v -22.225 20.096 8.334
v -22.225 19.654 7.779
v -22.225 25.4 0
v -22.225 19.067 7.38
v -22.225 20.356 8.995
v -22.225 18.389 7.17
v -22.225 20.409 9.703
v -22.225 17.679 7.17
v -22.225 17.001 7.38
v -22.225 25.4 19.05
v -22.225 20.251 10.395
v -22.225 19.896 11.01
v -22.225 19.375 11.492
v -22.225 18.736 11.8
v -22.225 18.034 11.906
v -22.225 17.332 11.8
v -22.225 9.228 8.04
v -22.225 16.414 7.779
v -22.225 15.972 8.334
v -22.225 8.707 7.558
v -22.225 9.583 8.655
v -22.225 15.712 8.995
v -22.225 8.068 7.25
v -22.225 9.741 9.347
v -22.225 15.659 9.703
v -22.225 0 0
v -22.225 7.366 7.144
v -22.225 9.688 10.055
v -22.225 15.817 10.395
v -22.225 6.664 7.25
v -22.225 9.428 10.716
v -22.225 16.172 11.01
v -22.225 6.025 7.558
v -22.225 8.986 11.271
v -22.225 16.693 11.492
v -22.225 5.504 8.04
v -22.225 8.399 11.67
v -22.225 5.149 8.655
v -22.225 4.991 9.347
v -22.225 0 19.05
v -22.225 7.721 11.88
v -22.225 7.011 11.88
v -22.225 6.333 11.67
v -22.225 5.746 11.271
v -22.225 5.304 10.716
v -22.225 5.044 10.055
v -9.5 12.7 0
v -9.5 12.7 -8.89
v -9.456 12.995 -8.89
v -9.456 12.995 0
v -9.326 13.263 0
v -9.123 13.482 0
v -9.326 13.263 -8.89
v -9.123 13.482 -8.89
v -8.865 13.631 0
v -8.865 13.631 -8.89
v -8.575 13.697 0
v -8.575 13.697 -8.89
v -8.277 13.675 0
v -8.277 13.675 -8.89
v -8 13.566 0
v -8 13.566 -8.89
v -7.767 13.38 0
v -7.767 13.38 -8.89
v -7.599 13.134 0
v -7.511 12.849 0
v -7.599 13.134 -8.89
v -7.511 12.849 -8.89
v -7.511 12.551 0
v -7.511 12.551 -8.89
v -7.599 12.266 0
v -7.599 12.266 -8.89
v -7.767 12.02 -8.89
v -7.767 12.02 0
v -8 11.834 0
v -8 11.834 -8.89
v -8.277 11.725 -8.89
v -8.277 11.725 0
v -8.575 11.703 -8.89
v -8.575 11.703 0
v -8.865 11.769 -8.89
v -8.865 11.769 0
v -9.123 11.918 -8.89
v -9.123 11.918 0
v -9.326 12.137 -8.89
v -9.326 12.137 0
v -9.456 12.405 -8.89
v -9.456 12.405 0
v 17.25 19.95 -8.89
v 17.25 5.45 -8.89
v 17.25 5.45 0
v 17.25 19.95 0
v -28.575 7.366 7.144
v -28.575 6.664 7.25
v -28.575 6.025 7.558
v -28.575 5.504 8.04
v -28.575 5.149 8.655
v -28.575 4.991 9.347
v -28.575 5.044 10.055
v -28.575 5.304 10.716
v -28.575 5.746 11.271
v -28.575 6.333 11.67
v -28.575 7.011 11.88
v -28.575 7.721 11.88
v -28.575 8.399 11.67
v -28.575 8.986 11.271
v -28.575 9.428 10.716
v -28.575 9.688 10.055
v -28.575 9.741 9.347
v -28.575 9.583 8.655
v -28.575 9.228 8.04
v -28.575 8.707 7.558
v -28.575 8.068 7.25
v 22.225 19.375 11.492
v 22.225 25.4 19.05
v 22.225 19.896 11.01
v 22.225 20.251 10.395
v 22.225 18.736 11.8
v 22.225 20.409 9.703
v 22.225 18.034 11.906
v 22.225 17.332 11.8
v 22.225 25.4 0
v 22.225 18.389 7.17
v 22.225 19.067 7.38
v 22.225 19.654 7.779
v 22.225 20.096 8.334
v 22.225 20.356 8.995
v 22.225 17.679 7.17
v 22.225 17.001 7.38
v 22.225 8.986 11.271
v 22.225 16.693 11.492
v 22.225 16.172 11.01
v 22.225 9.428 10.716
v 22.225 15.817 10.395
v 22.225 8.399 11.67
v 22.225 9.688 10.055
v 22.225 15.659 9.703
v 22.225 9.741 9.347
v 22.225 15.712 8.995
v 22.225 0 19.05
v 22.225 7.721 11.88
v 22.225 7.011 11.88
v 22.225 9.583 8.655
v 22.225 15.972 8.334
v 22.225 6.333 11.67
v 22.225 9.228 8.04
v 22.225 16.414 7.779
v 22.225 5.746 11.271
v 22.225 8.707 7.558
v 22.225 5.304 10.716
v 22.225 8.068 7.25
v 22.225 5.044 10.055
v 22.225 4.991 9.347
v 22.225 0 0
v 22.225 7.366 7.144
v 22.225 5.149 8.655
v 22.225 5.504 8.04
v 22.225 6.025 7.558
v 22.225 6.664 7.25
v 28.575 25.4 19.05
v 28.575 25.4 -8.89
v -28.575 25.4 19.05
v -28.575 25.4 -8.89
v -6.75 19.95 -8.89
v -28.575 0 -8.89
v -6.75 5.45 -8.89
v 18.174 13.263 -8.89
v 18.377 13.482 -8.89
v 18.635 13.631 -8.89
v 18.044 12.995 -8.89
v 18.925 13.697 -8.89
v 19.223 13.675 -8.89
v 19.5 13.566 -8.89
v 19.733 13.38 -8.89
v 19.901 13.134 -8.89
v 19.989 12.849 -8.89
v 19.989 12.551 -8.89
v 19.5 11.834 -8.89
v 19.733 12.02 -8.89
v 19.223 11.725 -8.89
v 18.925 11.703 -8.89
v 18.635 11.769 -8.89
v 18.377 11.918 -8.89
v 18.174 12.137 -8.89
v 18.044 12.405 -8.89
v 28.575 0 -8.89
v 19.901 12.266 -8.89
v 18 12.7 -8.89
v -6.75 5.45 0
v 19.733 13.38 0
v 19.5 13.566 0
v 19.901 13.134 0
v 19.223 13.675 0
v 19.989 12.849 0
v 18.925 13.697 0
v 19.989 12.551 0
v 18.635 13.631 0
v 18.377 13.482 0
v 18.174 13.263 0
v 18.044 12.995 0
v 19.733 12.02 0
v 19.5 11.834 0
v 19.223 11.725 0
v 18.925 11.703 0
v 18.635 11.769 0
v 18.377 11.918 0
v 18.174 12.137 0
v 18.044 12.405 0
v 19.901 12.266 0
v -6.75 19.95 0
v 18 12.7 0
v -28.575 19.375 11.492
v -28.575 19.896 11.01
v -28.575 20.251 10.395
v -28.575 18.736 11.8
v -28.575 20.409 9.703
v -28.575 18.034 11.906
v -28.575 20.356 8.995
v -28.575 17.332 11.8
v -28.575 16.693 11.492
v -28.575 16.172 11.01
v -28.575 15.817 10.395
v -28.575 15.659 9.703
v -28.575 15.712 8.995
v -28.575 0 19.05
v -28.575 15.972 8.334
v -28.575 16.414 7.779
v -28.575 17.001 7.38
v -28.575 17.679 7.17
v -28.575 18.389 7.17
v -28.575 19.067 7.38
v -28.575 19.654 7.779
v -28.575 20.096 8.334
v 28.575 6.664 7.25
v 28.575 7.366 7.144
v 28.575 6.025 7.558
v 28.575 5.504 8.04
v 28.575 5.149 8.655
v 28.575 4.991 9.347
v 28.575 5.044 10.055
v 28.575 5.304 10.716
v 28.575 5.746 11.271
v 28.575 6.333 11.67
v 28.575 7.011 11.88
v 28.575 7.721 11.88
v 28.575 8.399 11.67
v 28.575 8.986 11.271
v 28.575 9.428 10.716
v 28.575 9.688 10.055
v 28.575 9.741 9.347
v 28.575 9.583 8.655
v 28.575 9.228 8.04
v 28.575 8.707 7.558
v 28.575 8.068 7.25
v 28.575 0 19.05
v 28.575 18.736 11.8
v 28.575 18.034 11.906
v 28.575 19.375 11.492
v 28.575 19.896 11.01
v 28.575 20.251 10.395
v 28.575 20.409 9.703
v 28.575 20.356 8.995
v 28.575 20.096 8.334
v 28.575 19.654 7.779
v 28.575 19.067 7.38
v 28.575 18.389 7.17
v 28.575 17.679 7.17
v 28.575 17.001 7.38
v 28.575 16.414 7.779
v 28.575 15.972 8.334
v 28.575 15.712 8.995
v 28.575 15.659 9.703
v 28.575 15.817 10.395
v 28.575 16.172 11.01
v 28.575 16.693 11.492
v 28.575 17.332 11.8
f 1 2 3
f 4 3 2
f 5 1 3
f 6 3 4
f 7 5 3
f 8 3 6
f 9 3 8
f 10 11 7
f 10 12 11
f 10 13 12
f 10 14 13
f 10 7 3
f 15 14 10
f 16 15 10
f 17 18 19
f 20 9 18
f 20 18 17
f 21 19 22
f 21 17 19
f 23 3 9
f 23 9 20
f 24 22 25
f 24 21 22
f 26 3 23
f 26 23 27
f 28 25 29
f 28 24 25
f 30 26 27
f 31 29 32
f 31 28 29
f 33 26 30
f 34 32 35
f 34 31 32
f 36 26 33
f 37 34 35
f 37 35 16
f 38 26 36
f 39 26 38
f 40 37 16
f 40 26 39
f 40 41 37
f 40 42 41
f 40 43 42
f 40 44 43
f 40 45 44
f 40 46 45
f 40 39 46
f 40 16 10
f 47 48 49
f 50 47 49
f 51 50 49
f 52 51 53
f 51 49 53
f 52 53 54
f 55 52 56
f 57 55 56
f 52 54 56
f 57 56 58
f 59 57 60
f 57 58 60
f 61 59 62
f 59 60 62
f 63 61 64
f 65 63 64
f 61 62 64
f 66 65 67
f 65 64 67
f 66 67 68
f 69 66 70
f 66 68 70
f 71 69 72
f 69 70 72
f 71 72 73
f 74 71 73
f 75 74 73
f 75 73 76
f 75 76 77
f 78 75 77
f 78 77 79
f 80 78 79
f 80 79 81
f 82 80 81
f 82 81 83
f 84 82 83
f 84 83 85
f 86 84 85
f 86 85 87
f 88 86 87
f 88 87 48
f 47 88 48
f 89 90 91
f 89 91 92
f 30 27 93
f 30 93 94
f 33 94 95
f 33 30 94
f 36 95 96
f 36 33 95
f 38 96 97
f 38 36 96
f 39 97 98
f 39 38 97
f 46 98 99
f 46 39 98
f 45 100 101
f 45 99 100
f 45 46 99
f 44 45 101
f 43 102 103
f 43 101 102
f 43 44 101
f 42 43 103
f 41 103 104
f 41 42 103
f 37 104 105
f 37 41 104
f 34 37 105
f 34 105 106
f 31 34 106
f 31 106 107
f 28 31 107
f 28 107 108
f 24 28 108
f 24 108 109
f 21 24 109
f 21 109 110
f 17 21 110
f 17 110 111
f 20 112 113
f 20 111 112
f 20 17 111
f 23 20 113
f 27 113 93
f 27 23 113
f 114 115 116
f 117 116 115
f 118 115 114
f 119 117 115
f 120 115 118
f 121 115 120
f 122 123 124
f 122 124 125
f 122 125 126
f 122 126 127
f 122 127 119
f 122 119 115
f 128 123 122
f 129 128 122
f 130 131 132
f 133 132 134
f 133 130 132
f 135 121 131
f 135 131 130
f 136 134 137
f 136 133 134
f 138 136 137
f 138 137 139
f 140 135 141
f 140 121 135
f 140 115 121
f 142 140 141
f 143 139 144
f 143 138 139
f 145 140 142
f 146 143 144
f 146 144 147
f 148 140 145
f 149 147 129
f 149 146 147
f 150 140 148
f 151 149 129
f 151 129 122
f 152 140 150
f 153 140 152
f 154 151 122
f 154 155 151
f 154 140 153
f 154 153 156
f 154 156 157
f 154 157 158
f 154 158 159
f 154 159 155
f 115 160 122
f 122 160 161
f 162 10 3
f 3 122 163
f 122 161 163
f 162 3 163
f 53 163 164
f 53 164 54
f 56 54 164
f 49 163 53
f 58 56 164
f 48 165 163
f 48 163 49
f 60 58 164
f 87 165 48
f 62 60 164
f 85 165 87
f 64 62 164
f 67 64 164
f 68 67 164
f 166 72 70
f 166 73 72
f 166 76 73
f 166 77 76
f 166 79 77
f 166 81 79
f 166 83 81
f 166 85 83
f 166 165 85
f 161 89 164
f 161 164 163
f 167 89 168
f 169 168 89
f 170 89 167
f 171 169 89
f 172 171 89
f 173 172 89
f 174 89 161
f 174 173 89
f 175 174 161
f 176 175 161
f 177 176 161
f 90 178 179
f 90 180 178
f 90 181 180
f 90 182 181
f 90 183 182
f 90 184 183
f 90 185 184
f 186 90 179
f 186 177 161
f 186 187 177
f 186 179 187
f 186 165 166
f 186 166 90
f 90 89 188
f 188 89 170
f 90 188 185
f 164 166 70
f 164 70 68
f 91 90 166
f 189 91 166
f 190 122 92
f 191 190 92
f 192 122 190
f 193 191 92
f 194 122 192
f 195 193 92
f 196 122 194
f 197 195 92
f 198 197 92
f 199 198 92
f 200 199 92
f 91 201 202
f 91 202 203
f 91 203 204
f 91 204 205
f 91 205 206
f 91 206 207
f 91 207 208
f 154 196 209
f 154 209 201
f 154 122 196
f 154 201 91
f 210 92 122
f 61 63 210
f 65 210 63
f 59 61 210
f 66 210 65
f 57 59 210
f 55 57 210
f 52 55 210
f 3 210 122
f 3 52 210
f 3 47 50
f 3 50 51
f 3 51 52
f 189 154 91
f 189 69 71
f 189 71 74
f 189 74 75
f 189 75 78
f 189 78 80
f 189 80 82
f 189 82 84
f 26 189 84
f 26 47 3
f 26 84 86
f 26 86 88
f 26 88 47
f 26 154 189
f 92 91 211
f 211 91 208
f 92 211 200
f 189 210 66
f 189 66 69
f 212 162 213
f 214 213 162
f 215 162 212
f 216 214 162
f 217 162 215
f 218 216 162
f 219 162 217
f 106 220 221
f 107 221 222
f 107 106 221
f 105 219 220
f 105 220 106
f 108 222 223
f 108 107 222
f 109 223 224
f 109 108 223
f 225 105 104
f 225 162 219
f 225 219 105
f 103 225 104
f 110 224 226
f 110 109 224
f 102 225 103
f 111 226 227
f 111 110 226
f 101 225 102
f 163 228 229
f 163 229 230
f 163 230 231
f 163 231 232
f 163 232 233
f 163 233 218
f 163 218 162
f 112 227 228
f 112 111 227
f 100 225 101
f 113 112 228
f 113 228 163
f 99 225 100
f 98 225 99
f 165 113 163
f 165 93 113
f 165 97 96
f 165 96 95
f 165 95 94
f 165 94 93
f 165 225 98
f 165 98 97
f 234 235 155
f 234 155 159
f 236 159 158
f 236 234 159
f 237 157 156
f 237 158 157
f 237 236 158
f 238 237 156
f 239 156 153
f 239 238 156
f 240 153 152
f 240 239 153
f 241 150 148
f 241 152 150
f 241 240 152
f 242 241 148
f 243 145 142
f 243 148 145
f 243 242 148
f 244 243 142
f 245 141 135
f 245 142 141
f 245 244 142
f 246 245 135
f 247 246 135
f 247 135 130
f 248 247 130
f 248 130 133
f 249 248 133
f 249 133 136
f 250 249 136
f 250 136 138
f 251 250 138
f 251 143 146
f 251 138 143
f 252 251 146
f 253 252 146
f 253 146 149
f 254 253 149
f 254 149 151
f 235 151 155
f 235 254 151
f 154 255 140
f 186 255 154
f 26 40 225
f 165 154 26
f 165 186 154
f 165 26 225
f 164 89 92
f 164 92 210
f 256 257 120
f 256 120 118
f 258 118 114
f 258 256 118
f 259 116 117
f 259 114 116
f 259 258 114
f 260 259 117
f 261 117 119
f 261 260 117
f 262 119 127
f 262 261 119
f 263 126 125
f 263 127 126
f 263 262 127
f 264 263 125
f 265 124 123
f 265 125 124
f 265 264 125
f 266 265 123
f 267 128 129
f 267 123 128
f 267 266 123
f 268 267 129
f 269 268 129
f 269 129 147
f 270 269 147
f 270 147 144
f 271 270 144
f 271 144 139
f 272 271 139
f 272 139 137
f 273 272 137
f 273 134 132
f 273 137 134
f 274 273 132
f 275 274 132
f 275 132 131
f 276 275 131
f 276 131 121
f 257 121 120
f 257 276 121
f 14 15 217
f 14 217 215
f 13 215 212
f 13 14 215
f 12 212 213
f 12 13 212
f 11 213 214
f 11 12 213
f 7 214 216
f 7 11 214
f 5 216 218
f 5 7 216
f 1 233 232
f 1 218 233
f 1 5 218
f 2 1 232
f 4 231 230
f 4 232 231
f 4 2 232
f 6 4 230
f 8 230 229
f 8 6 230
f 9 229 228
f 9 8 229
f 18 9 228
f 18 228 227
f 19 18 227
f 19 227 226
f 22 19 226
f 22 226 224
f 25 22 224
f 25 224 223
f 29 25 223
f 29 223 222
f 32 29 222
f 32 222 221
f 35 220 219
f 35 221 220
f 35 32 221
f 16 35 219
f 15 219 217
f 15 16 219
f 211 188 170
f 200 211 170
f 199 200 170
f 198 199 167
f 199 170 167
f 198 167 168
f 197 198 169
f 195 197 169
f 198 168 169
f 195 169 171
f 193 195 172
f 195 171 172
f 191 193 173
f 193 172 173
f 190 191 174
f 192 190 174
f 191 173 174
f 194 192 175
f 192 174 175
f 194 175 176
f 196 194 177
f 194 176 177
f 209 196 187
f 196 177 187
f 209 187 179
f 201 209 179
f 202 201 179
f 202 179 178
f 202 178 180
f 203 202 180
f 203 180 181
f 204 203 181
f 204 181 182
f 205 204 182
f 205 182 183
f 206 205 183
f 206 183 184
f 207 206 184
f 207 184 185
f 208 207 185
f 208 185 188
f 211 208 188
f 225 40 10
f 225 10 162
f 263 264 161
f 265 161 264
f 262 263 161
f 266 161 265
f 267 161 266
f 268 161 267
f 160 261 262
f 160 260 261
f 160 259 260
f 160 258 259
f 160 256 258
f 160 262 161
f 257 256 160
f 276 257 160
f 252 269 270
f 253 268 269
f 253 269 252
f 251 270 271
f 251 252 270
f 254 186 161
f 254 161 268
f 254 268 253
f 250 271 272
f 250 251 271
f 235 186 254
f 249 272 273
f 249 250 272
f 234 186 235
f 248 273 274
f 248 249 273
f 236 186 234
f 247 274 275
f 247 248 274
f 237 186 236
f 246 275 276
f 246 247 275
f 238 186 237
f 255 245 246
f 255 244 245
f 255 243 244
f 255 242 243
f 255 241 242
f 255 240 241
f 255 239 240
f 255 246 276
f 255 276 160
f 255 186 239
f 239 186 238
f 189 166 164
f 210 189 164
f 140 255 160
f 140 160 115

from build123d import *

# Parameters (mm, degrees)
BOSS_EXTRUDE1_DEPTH     = 25.4
CUT_EXTRUDE1_DEPTH      = 60.905780189
CUT_EXTRUDE1_DEPTH_BACK = 60.905780189
SKETCH2_R               = 2.38125
SKETCH3_R               = 1
SKETCH3_W               = 24
SKETCH3_H               = 14.5
CUT_EXTRUDE2_DEPTH      = 48.353291596


with BuildPart() as part:
    # Sketch1 → Boss-Extrude1 (new body)
    with BuildSketch(Plane(origin=(0, 0, 0), x_dir=(1, 0, 0), z_dir=(0, 1, 0))):
        Polygon((-28.575, 8.89), (28.575, 8.89), (28.575, -19.05), (22.225, -19.05), (22.225, 0), (-22.225, 0), (-22.225, -19.05), (-28.575, -19.05), align=None)
    extrude(amount=BOSS_EXTRUDE1_DEPTH)

    # Sketch2 → Cut-Extrude1 (cut, two sides: drawn at the far end of the back side and taken through both)
    with BuildSketch(Plane.ZY.offset(-22.225).offset(-CUT_EXTRUDE1_DEPTH_BACK)):
        with Locations((9.525, 18.034)):
            Circle(SKETCH2_R)
        with Locations(Location((9.525, 7.366, 0), (0, 0, 180))):
            Circle(SKETCH2_R)
    extrude(amount=CUT_EXTRUDE1_DEPTH + CUT_EXTRUDE1_DEPTH_BACK, mode=Mode.SUBTRACT)

    # Sketch3 → Cut-Extrude2 (cut, through all)
    with BuildSketch(Plane(origin=(0, 0, -8.89), x_dir=(-1, 0, 0), z_dir=(0, 0, -1))):
        with Locations((8.5, 12.7)):
            Circle(SKETCH3_R)
        with Locations((-19, 12.7)):
            Circle(SKETCH3_R)
        with Locations((-5.25, 12.7)):
            Rectangle(SKETCH3_W, SKETCH3_H)
    extrude(amount=-CUT_EXTRUDE2_DEPTH, mode=Mode.SUBTRACT)


solid = part.part
